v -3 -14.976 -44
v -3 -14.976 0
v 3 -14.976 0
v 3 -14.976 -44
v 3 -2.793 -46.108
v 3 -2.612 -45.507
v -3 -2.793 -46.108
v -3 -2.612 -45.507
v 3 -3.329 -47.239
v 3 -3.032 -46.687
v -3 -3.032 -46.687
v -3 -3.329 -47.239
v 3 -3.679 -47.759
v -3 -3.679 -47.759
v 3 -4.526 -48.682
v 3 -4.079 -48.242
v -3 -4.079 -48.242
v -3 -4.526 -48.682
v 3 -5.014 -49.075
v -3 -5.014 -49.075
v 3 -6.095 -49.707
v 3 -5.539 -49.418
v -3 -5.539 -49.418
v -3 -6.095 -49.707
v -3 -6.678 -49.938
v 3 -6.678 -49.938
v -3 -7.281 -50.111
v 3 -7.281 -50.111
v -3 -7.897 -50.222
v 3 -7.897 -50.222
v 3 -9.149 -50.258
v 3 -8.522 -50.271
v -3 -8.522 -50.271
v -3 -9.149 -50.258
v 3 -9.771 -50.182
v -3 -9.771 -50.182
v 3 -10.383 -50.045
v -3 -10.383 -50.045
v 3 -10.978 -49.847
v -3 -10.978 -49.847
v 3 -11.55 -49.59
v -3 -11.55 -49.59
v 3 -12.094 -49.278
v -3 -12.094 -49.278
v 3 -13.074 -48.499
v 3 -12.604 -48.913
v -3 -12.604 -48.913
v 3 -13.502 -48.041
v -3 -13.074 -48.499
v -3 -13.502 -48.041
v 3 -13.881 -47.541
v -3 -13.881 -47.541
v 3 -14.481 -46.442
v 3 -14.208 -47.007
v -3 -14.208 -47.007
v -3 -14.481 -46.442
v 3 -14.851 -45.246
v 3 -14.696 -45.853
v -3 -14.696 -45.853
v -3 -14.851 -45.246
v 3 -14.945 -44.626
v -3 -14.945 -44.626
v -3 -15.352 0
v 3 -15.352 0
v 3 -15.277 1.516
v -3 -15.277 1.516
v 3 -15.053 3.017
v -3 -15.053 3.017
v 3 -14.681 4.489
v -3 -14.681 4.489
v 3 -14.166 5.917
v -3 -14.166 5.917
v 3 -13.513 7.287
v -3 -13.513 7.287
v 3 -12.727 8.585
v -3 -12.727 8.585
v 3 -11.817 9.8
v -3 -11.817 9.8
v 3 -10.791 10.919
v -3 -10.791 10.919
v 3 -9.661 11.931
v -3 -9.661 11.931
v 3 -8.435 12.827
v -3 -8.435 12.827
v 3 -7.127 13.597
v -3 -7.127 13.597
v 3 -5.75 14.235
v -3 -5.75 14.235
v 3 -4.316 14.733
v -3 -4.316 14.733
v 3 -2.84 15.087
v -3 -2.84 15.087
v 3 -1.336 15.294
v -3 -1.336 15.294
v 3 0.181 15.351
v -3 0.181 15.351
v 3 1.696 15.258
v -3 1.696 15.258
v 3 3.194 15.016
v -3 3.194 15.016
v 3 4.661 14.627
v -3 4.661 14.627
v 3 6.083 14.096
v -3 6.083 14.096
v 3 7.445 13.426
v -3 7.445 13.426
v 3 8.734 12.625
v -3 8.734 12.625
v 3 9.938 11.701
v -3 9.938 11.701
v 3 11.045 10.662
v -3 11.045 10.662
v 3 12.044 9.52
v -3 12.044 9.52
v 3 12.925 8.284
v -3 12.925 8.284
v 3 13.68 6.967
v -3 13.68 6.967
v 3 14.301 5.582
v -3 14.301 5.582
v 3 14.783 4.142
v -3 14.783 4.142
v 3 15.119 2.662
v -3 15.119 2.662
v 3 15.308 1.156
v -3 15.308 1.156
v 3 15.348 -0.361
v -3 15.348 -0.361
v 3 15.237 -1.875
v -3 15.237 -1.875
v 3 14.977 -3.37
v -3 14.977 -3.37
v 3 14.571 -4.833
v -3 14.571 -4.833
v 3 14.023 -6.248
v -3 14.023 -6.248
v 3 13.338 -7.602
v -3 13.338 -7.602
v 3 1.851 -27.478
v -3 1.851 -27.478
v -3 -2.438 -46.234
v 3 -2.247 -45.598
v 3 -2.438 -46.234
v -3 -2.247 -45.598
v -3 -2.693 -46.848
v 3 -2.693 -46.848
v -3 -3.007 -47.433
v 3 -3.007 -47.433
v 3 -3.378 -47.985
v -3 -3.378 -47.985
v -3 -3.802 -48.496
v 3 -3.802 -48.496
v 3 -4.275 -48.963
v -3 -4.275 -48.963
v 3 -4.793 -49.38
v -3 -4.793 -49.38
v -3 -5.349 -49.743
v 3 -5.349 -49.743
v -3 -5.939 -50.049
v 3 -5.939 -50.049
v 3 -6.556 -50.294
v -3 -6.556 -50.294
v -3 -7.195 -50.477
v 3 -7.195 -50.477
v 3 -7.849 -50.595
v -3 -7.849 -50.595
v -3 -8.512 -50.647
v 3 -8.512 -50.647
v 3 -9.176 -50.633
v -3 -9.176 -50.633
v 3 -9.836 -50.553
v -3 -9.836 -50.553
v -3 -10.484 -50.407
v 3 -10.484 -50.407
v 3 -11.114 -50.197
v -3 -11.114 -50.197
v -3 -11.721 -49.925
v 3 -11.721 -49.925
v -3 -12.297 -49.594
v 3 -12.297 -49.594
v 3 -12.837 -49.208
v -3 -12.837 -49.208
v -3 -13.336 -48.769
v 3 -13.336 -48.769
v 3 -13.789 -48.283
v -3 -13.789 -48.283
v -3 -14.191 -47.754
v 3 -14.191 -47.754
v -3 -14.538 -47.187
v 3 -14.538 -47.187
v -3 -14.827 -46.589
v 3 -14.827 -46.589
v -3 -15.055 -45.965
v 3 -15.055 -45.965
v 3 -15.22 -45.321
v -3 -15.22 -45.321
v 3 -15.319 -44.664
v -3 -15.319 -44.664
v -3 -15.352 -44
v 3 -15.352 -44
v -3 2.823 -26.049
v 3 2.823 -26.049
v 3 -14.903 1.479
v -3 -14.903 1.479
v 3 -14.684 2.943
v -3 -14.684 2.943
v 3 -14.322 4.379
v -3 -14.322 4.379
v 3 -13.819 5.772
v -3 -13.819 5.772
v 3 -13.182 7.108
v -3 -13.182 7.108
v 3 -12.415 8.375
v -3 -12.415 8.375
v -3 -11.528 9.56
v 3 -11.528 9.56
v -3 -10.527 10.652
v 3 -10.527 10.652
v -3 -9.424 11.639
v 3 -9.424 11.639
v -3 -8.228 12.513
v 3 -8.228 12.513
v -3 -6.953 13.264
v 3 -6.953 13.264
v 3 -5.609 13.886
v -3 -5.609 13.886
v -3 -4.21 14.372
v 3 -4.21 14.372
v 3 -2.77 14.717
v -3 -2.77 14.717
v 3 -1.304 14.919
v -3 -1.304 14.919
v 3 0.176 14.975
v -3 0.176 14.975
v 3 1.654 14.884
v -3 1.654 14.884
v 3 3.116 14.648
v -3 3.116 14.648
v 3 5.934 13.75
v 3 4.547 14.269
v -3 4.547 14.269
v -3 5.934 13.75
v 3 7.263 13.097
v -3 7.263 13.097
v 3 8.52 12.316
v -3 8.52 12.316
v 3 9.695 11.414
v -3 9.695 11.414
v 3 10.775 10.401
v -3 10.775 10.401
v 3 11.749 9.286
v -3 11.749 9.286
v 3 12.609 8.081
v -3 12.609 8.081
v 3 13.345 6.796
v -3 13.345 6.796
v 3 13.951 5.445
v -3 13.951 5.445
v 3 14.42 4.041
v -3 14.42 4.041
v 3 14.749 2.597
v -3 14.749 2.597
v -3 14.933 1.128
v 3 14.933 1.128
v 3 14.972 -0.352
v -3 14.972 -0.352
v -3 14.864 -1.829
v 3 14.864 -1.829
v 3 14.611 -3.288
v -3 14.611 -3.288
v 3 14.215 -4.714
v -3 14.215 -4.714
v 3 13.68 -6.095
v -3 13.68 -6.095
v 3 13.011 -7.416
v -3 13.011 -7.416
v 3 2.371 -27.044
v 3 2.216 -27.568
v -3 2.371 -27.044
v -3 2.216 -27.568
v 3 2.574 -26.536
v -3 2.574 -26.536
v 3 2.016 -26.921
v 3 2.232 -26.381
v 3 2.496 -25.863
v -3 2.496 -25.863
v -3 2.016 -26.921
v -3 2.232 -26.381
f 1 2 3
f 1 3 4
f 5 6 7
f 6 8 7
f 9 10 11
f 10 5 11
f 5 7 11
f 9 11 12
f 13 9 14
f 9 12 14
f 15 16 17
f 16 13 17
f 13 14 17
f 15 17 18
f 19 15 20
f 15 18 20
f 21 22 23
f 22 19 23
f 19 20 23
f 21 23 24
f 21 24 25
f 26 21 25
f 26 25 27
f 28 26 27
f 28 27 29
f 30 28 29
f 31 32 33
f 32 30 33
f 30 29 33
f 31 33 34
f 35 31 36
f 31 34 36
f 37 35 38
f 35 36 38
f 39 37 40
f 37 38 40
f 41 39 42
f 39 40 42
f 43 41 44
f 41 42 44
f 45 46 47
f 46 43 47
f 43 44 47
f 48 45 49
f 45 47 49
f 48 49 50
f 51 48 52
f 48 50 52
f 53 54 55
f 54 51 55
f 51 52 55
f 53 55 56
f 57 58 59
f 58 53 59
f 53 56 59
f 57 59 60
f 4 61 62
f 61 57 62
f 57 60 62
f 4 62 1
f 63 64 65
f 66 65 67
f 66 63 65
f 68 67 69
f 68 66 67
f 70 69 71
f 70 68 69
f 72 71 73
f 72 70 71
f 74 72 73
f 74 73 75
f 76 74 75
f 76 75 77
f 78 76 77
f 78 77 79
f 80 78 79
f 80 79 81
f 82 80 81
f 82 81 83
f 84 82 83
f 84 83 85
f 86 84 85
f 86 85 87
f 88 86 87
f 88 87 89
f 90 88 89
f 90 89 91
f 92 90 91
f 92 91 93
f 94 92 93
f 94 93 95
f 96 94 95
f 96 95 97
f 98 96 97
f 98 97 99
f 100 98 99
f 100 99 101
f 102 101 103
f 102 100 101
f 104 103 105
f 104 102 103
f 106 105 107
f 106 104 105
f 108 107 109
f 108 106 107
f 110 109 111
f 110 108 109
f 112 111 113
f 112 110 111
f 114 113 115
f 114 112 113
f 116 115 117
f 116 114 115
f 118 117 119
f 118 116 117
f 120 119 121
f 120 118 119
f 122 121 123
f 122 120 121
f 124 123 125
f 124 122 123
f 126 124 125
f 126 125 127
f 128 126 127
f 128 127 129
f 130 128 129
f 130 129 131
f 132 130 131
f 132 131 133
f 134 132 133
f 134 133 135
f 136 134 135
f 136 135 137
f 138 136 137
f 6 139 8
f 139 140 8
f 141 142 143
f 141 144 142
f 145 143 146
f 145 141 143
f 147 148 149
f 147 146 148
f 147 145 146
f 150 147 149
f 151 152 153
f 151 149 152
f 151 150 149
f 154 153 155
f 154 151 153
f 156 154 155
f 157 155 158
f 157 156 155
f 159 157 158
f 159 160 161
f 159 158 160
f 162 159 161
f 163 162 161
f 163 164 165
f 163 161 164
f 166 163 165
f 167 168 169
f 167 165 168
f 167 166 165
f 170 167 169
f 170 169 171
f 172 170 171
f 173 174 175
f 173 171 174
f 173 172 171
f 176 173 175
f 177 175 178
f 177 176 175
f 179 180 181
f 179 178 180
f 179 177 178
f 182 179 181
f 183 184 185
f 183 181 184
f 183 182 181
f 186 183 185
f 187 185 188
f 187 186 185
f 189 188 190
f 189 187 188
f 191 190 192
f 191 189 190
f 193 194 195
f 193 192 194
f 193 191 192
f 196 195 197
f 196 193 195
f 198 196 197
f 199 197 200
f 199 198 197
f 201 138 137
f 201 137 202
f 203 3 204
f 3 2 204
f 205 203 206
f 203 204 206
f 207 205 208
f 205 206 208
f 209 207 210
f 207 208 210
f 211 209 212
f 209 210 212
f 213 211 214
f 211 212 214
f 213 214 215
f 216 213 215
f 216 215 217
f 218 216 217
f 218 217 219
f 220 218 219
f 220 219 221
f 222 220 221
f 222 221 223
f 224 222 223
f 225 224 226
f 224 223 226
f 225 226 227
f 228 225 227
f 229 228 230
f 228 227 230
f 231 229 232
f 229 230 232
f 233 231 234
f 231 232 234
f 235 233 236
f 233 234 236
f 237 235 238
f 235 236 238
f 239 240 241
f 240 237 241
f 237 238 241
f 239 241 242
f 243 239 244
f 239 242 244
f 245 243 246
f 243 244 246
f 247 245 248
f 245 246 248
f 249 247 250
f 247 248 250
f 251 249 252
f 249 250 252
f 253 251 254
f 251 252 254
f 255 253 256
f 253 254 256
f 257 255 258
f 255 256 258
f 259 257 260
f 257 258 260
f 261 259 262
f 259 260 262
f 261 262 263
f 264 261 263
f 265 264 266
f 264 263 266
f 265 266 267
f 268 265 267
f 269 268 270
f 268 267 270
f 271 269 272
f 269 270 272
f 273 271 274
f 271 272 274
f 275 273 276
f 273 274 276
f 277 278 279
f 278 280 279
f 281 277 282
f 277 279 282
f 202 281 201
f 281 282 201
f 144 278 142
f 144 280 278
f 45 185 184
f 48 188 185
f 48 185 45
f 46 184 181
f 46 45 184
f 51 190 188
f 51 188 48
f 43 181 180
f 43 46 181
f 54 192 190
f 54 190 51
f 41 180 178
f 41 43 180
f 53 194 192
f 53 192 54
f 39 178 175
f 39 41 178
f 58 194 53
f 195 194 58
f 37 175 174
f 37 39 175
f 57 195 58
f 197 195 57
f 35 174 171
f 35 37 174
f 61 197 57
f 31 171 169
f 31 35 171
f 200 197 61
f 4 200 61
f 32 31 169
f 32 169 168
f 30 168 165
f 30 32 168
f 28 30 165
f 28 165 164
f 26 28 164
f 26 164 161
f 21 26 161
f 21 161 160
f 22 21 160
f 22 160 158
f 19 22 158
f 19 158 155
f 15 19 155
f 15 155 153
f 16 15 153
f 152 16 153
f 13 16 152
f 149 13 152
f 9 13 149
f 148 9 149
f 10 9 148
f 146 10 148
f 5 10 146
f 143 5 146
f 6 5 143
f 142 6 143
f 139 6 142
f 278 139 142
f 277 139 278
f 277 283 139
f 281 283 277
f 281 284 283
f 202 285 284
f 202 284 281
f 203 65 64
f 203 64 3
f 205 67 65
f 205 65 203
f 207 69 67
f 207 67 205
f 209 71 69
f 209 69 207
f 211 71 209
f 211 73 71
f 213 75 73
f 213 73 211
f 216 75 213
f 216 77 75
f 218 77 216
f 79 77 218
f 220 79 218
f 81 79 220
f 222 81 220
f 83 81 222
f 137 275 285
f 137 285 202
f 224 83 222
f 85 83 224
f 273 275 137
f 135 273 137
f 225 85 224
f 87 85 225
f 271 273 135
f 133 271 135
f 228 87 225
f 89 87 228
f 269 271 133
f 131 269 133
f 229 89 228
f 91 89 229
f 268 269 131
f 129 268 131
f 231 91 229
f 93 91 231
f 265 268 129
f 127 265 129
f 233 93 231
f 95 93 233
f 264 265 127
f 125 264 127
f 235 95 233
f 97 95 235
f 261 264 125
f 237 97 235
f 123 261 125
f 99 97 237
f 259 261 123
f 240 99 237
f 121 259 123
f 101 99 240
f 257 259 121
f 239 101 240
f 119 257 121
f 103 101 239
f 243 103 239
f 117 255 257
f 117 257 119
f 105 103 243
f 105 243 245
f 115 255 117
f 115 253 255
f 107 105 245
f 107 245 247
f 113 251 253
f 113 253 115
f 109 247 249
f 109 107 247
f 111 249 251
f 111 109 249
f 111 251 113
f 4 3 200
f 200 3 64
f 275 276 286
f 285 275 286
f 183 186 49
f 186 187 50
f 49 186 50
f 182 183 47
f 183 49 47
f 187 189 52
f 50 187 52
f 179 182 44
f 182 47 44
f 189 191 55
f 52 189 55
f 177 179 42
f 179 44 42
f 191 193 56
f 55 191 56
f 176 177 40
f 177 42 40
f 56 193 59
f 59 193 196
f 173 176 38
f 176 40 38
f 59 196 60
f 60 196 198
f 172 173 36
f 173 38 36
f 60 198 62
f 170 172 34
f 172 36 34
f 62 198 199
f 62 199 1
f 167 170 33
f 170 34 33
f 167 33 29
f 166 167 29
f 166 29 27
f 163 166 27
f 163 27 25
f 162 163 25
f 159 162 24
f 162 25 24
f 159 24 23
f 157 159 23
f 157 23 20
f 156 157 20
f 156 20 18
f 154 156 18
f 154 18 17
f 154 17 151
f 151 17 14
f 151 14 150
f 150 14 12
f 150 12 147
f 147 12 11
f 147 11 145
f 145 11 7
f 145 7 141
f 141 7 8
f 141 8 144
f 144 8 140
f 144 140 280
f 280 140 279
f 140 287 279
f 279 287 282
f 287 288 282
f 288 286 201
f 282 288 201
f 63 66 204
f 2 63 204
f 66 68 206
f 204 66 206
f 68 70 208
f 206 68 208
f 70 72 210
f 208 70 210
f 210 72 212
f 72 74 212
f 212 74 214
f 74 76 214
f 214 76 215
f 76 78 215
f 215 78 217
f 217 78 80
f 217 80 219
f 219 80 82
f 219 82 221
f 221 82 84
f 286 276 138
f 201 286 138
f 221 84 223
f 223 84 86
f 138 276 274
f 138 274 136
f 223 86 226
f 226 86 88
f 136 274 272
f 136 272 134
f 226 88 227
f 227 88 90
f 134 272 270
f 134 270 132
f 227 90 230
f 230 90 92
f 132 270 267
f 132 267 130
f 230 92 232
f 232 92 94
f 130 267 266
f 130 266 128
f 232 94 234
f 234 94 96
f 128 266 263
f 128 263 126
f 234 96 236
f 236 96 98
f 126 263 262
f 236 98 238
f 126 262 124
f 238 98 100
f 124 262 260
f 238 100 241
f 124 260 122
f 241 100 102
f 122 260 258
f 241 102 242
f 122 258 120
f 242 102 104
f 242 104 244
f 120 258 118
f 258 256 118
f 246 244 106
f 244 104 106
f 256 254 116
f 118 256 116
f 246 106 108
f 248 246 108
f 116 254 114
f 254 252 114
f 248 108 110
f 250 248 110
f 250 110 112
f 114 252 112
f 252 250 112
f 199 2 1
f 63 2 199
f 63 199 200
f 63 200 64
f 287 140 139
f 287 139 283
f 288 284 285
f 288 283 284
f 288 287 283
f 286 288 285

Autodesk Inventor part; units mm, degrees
ref_plane "YZ Plane" through (0, 0, 0) normal (1, 0, 0) x (0, 1, 0)
ref_plane "XZ Plane" through (0, 0, 0) normal (0, 1, 0) x (-1, 0, 0)
ref_plane "XY Plane" through (0, 0, 0) normal (0, 0, 1) x (1, 0, 0)
sketch "Sketch1" plane through (0, 0, 0) normal (1, 0, 0) x (0, 1, 0)
  arc A0 (13.0108, -7.4161) -> (-14.976, 0) centre (0, 0) ccw
  arc A1 (-14.976, -44) -> (-2.6118, -45.5074) centre (-8.702, -44) ccw
  arc A2 (2.4963, -25.8629) -> (1.8506, -27.478) centre (8, -29) ccw
  line L0 (0, -65.4344) -> (0, 32.8066) projected
  line L1 (1.8506, -27.478) -> (-2.6118, -45.5074)
  line L2 (13.0108, -7.4161) -> (2.4963, -25.8629)
  line L3 (-14.976, 0) -> (-14.976, -44)
  arc A3 (13.3375, -7.6023) -> (-15.352, 0) centre (0, 0) ccw
  line L4 (13.3375, -7.6023) -> (2.8229, -26.0491)
  arc A4 (2.8229, -26.0491) -> (2.2155, -27.5683) centre (8, -29) ccw
  line L5 (2.2155, -27.5683) -> (-2.2468, -45.5977)
  arc A5 (-15.352, -44) -> (-2.2468, -45.5977) centre (-8.702, -44) ccw
  line L6 (-15.352, -44) -> (-15.352, 0)
  dimension "d0" = 29.952
  dimension "d1" = 12.548
  dimension "d2" = 12.67
  dimension "d3" = 29
  dimension "d4" = 44
  dimension "d5" = 8.702
  dimension "d6" = 8
  dimension "d7" = 0.376
extrude "Extrusion1" add sketch "Sketch1" along normal mid plane 6 contours A0 L0 A3 L4 A4 L5 L1 A2 L2 | A0 L3 A1 L1 L0 L5 A5 L6 A3
properties part number "czesc2paska" material "Rubber"
